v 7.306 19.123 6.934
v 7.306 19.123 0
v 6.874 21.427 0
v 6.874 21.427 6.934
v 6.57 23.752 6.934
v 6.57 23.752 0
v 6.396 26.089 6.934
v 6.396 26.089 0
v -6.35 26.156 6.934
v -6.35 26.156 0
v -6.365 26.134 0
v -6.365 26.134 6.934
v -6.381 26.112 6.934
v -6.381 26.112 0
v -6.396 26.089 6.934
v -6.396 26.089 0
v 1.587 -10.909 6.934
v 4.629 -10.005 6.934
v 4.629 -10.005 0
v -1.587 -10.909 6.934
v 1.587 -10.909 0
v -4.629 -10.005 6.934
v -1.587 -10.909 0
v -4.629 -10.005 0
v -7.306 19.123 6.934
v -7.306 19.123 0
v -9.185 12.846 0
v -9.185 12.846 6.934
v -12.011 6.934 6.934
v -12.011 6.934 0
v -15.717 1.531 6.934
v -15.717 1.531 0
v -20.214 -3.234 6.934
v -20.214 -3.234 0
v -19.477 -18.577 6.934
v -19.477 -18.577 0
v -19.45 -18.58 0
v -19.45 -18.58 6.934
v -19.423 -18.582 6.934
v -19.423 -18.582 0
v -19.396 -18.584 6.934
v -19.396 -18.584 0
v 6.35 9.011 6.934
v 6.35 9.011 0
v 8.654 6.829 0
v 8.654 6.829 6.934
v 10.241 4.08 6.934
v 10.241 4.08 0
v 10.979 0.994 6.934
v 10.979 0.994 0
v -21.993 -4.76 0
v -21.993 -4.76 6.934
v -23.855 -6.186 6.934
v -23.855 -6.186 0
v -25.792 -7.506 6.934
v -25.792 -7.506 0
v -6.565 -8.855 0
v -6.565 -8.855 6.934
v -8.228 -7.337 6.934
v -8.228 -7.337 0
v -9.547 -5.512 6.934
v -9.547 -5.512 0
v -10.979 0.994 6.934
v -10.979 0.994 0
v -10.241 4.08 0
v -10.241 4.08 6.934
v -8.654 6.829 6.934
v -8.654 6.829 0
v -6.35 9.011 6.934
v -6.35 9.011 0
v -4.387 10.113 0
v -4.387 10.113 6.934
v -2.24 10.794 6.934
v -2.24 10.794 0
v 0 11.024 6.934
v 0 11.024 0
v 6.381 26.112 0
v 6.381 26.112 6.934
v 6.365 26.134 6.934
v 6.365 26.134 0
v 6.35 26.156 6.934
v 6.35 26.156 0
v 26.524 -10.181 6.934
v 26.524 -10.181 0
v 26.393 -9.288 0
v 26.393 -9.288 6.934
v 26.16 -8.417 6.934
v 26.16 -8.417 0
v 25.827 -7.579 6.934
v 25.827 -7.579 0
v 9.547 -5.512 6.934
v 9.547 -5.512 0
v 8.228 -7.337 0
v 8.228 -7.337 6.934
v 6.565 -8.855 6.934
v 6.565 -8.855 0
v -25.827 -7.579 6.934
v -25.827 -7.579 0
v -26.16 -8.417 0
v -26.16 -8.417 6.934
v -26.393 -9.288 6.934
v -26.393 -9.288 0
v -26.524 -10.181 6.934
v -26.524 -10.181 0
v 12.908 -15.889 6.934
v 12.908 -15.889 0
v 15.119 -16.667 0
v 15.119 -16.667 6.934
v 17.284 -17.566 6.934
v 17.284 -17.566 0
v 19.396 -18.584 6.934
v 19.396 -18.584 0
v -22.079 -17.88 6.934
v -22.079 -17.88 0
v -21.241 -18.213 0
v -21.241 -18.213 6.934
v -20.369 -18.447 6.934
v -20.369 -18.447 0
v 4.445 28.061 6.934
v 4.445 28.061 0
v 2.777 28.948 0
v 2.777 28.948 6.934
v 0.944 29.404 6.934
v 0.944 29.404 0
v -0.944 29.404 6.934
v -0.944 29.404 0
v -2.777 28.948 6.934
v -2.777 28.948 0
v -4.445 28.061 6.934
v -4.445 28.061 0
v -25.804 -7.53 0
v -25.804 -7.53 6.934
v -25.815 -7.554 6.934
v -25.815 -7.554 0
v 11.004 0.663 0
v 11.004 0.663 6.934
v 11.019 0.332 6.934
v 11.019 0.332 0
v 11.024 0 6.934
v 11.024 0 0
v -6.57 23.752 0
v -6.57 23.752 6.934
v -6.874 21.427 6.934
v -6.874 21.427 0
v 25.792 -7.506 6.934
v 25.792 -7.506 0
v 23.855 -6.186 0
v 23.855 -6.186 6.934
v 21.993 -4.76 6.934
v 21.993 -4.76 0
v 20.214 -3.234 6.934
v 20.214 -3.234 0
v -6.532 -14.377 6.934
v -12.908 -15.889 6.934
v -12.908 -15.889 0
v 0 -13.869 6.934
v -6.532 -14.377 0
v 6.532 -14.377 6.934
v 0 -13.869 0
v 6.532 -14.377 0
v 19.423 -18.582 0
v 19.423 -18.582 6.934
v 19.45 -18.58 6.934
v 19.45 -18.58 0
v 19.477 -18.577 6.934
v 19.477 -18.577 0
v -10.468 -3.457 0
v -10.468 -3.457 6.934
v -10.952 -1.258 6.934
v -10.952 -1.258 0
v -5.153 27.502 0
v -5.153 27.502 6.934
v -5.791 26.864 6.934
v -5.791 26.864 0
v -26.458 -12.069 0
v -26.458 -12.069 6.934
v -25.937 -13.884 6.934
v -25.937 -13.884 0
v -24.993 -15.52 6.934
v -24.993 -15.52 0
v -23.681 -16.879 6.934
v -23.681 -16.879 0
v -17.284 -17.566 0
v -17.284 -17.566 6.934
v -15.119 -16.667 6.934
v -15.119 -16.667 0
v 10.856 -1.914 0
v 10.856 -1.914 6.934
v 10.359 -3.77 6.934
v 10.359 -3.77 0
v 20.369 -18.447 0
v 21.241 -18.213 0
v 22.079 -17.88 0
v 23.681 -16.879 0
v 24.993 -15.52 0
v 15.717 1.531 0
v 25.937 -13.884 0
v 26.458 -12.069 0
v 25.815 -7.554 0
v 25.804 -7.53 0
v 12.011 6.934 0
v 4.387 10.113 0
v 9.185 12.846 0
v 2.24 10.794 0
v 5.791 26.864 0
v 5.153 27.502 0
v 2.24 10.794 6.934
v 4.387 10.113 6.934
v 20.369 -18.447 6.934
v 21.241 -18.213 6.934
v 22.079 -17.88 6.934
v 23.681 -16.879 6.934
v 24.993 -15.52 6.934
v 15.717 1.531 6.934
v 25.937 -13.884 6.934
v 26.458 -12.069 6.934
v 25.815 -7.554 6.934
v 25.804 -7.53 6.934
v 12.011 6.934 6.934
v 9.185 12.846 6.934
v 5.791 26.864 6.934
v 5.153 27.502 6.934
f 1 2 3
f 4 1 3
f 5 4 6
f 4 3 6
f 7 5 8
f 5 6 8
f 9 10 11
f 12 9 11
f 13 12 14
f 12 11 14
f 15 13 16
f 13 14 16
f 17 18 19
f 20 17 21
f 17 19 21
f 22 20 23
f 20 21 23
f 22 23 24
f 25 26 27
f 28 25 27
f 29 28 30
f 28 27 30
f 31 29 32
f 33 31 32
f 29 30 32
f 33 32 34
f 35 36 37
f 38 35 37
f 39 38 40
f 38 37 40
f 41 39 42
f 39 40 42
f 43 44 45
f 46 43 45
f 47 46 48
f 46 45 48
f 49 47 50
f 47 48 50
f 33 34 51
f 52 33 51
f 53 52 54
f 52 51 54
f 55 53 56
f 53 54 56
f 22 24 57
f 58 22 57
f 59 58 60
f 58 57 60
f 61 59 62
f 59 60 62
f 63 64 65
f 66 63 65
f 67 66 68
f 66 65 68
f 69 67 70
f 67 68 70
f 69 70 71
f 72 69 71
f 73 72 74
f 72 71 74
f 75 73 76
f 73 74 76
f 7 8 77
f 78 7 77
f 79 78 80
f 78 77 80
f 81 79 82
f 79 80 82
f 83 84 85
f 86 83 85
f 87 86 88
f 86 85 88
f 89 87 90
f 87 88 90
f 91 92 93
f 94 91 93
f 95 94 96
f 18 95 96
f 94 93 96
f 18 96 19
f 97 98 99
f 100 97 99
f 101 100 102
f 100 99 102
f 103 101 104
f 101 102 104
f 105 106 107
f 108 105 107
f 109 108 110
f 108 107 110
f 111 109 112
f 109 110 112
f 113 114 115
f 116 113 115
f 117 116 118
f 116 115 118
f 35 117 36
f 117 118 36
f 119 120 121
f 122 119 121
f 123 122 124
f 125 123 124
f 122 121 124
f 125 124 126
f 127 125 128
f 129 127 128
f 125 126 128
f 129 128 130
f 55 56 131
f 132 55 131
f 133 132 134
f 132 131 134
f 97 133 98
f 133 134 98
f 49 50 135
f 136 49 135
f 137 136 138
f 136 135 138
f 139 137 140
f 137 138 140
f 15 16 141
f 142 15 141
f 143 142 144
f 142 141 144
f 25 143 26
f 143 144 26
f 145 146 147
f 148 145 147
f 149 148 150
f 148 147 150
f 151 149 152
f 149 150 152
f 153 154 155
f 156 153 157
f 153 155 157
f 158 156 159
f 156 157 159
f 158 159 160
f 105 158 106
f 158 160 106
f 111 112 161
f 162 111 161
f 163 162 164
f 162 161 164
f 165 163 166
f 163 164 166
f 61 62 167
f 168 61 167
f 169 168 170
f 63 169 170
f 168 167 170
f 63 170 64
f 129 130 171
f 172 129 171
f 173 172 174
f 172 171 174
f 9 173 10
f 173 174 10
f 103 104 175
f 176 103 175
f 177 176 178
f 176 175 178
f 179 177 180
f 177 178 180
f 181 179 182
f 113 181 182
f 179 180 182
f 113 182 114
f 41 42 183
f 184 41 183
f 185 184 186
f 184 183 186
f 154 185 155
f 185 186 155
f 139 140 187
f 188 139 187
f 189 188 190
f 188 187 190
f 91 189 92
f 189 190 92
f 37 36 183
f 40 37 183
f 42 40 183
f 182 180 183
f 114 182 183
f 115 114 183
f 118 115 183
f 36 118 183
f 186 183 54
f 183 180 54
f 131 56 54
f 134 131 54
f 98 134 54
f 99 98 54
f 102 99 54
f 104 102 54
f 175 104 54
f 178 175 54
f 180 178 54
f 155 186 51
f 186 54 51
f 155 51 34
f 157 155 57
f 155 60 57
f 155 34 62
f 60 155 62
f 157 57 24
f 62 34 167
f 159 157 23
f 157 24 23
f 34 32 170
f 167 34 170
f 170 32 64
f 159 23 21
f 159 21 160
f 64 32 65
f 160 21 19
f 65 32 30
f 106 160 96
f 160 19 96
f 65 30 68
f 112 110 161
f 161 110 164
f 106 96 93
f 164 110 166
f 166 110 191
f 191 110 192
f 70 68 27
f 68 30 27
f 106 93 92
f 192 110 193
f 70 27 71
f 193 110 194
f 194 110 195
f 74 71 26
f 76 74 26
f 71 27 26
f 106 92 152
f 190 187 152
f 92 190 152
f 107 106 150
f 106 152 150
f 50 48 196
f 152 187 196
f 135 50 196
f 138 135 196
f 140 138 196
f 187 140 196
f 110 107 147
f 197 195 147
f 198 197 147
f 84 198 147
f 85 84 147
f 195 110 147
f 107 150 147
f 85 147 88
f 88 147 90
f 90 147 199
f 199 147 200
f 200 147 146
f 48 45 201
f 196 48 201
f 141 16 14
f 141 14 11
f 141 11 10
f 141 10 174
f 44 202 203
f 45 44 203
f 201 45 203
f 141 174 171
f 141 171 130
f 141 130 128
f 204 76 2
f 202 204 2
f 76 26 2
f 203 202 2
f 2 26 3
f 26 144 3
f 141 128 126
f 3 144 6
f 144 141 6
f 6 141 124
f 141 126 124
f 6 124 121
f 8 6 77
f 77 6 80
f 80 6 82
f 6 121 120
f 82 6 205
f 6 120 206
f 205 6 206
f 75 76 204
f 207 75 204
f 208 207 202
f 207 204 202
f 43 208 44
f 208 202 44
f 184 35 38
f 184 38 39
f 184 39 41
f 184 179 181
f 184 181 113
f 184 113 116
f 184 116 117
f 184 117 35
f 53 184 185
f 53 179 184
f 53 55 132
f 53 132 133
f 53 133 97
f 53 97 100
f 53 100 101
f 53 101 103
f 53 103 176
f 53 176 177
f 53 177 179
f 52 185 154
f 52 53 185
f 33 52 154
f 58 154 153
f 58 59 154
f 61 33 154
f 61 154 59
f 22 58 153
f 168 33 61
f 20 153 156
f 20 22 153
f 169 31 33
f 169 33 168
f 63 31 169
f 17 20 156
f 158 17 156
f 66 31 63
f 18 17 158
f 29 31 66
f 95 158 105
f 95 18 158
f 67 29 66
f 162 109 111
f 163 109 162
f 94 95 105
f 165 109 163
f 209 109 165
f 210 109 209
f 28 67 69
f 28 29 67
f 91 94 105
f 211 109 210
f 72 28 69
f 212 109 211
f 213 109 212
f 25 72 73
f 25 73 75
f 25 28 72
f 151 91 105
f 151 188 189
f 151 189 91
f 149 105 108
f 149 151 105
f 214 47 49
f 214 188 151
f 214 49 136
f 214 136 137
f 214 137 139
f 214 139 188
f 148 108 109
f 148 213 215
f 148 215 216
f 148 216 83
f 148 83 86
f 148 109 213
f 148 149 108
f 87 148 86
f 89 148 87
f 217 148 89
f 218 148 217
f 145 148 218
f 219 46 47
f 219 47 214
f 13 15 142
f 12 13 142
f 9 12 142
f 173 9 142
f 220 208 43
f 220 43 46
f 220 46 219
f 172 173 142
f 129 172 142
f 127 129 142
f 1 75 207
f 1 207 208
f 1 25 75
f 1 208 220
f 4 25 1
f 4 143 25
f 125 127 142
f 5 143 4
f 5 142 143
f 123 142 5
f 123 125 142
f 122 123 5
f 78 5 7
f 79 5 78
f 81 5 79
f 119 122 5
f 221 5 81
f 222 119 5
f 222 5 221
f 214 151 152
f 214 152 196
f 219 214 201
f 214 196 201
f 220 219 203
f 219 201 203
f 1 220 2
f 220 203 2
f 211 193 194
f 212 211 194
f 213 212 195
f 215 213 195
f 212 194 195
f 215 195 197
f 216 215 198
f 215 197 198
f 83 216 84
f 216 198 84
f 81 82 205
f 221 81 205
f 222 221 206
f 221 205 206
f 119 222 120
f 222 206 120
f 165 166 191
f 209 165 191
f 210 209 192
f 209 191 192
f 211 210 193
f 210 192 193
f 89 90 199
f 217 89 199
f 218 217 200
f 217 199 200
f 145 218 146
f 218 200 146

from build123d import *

# Parameters (mm, degrees)
F1_DEPTH = 6.9342


with BuildPart() as f1:
    # F0 (on Top) → F1 (new body)
    with BuildSketch(Plane.XY):
        with BuildLine():
            ThreePointArc((10.978713393, 0.9937852859), (11.0123726308, 0.4973992365), (11.0236, 0))
            ThreePointArc((11.0236, 0), (10.6479799387, -2.8531176256), (9.5467176412, -5.5118))
            ThreePointArc((9.5467176412, -5.5118), (7.4352089911, -8.1386377373), (4.628713393, -10.0047373422))
            Line((4.628713393, -10.0047373422), (11.7777531012, -14.1322373422))
            ThreePointArc((11.7777531012, -14.1322373422), (12.0895321135, -6.9798946201), (18.1277531012, -3.1337147141))
            Line((18.1277531012, -3.1337147141), (10.978713393, 0.9937852859))
        make_face()
        with BuildLine():
            ThreePointArc((6.35, 9.0109520562), (9.5467176412, 5.5118), (10.978713393, 0.9937852859))
            Line((10.978713393, 0.9937852859), (18.1277531012, -3.1337147141))
            ThreePointArc((18.1277531012, -3.1337147141), (19.1741700395, -3.1132418489), (20.2138057566, -3.2339278992))
            ThreePointArc((20.2138057566, -3.2339278992), (12.0108278998, 6.9344547212), (7.3062391636, 19.1226332419))
            ThreePointArc((7.3062391636, 19.1226332419), (6.8909384905, 18.1619392751), (6.35, 17.2659520562))
            Line((6.35, 17.2659520562), (6.35, 9.0109520562))
        make_face()
        with BuildLine():
            ThreePointArc((0, 11.0236), (3.3306625371, 10.5083987374), (6.35, 9.0109520562))
            Line((6.35, 9.0109520562), (6.35, 17.2659520562))
            ThreePointArc((6.35, 17.2659520562), (0, 13.9597892403), (-6.35, 17.2659520562))
            Line((-6.35, 17.2659520562), (-6.35, 9.0109520562))
            ThreePointArc((-6.35, 9.0109520562), (-3.3306625371, 10.5083987374), (0, 11.0236))
        make_face()
        with BuildLine():
            ThreePointArc((20.2138057566, -3.2339278992), (19.1741700395, -3.1132418489), (18.1277531012, -3.1337147141))
            Line((18.1277531012, -3.1337147141), (25.8267189409, -7.5787147141))
            ThreePointArc((25.8267189409, -7.5787147141), (25.8095339268, -7.5421240909), (25.7921583133, -7.5056235914))
            ThreePointArc((25.7921583133, -7.5056235914), (22.9140380361, -5.4859265713), (20.2138057566, -3.2339278992))
        make_face()
        with BuildLine():
            Line((25.8267189409, -7.5787147141), (18.1277531012, -3.1337147141))
            ThreePointArc((18.1277531012, -3.1337147141), (12.0895321135, -6.9798946201), (11.7777531012, -14.1322373422))
            Line((11.7777531012, -14.1322373422), (19.4767189409, -18.5772373422))
            ThreePointArc((19.4767189409, -18.5772373422), (20.8083845795, -18.3425243759), (22.0789973351, -17.8799589479))
            Line((22.0789973351, -17.8799589479), (26.5239973351, -10.1809931083))
            ThreePointArc((26.5239973351, -10.1809931083), (26.2892843688, -8.8493274697), (25.8267189409, -7.5787147141))
        make_face()
        with BuildLine():
            Line((11.7777531012, -14.1322373422), (4.628713393, -10.0047373422))
            ThreePointArc((4.628713393, -10.0047373422), (0, -11.0236), (-4.628713393, -10.0047373422))
            Line((-4.628713393, -10.0047373422), (-11.7777531012, -14.1322373422))
            ThreePointArc((-11.7777531012, -14.1322373422), (-12.283231549, -15.0486974262), (-12.907566593, -15.8887053427))
            ThreePointArc((-12.907566593, -15.8887053427), (0, -13.8689094423), (12.907566593, -15.8887053427))
            ThreePointArc((12.907566593, -15.8887053427), (12.283231549, -15.0486974262), (11.7777531012, -14.1322373422))
        make_face()
        with BuildLine():
            ThreePointArc((-6.35, 17.2659520562), (0, 13.9597892403), (6.35, 17.2659520562))
            Line((6.35, 17.2659520562), (6.35, 26.1559520562))
            ThreePointArc((6.35, 26.1559520562), (5.4808997893, 27.1918518455), (4.445, 28.0609520562))
            Line((4.445, 28.0609520562), (-4.445, 28.0609520562))
            ThreePointArc((-4.445, 28.0609520562), (-5.4808997893, 27.1918518455), (-6.35, 26.1559520562))
            Line((-6.35, 26.1559520562), (-6.35, 17.2659520562))
        make_face()
        with BuildLine():
            Line((6.35, 26.1559520562), (6.35, 17.2659520562))
            ThreePointArc((6.35, 17.2659520562), (6.8909384905, 18.1619392751), (7.3062391636, 19.1226332419))
            ThreePointArc((7.3062391636, 19.1226332419), (6.706067244, 22.5871023282), (6.3960184553, 26.0894761135))
            ThreePointArc((6.3960184553, 26.0894761135), (6.3730959022, 26.1227740859), (6.35, 26.1559520562))
        make_face()
        with BuildLine():
            Line((19.4767189409, -18.5772373422), (11.7777531012, -14.1322373422))
            ThreePointArc((11.7777531012, -14.1322373422), (12.283231549, -15.0486974262), (12.907566593, -15.8887053427))
            ThreePointArc((12.907566593, -15.8887053427), (16.2079707921, -17.1011757569), (19.3961398581, -18.5838525221))
            ThreePointArc((19.3961398581, -18.5838525221), (19.4364380247, -18.580649995), (19.4767189409, -18.5772373422))
        make_face()
        with BuildLine():
            Line((-11.7777531012, -14.1322373422), (-4.628713393, -10.0047373422))
            ThreePointArc((-4.628713393, -10.0047373422), (-7.4352089911, -8.1386377373), (-9.5467176412, -5.5118))
            ThreePointArc((-9.5467176412, -5.5118), (-10.7658715282, -2.3697610001), (-10.978713393, 0.9937852859))
            Line((-10.978713393, 0.9937852859), (-18.1277531012, -3.1337147141))
            ThreePointArc((-18.1277531012, -3.1337147141), (-12.0895321135, -6.9798946201), (-11.7777531012, -14.1322373422))
        make_face()
        with BuildLine():
            ThreePointArc((-10.978713393, 0.9937852859), (-9.5467176412, 5.5118), (-6.35, 9.0109520562))
            Line((-6.35, 9.0109520562), (-6.35, 17.2659520562))
            ThreePointArc((-6.35, 17.2659520562), (-6.8909384905, 18.1619392751), (-7.3062391636, 19.1226332419))
            ThreePointArc((-7.3062391636, 19.1226332419), (-12.0108278998, 6.9344547212), (-20.2138057566, -3.2339278992))
            ThreePointArc((-20.2138057566, -3.2339278992), (-19.1741700395, -3.1132418489), (-18.1277531012, -3.1337147141))
            Line((-18.1277531012, -3.1337147141), (-10.978713393, 0.9937852859))
        make_face()
        with BuildLine():
            ThreePointArc((-7.3062391636, 19.1226332419), (-6.8909384905, 18.1619392751), (-6.35, 17.2659520562))
            Line((-6.35, 17.2659520562), (-6.35, 26.1559520562))
            ThreePointArc((-6.35, 26.1559520562), (-6.3730959022, 26.1227740859), (-6.3960184553, 26.0894761135))
            ThreePointArc((-6.3960184553, 26.0894761135), (-6.706067244, 22.5871023282), (-7.3062391636, 19.1226332419))
        make_face()
        with BuildLine():
            ThreePointArc((22.0789973351, -17.8799589479), (25.5149399286, -14.7310574361), (26.5239973351, -10.1809931083))
            Line((26.5239973351, -10.1809931083), (22.0789973351, -17.8799589479))
        make_face()
        with BuildLine():
            ThreePointArc((-12.907566593, -15.8887053427), (-12.283231549, -15.0486974262), (-11.7777531012, -14.1322373422))
            Line((-11.7777531012, -14.1322373422), (-19.4767189409, -18.5772373422))
            ThreePointArc((-19.4767189409, -18.5772373422), (-19.4364380247, -18.580649995), (-19.3961398581, -18.5838525221))
            ThreePointArc((-19.3961398581, -18.5838525221), (-16.2079707921, -17.1011757569), (-12.907566593, -15.8887053427))
        make_face()
        with BuildLine():
            Line((-19.4767189409, -18.5772373422), (-11.7777531012, -14.1322373422))
            ThreePointArc((-11.7777531012, -14.1322373422), (-12.0895321135, -6.9798946201), (-18.1277531012, -3.1337147141))
            Line((-18.1277531012, -3.1337147141), (-25.8267189409, -7.5787147141))
            ThreePointArc((-25.8267189409, -7.5787147141), (-26.2892843688, -8.8493274697), (-26.5239973351, -10.1809931083))
            Line((-26.5239973351, -10.1809931083), (-22.0789973351, -17.8799589479))
            ThreePointArc((-22.0789973351, -17.8799589479), (-20.8083845795, -18.3425243759), (-19.4767189409, -18.5772373422))
        make_face()
        with BuildLine():
            Line((-4.445, 28.0609520562), (4.445, 28.0609520562))
            ThreePointArc((4.445, 28.0609520562), (0, 29.4621148722), (-4.445, 28.0609520562))
        make_face()
        with BuildLine():
            Line((-25.8267189409, -7.5787147141), (-18.1277531012, -3.1337147141))
            ThreePointArc((-18.1277531012, -3.1337147141), (-19.1741700395, -3.1132418489), (-20.2138057566, -3.2339278992))
            ThreePointArc((-20.2138057566, -3.2339278992), (-22.9140380361, -5.4859265713), (-25.7921583133, -7.5056235914))
            ThreePointArc((-25.7921583133, -7.5056235914), (-25.8095339268, -7.5421240909), (-25.8267189409, -7.5787147141))
        make_face()
        with BuildLine():
            ThreePointArc((-26.5239973351, -10.1809931083), (-25.5149399286, -14.7310574361), (-22.0789973351, -17.8799589479))
            Line((-22.0789973351, -17.8799589479), (-26.5239973351, -10.1809931083))
        make_face()
    extrude(amount=F1_DEPTH)


solid = f1.part
